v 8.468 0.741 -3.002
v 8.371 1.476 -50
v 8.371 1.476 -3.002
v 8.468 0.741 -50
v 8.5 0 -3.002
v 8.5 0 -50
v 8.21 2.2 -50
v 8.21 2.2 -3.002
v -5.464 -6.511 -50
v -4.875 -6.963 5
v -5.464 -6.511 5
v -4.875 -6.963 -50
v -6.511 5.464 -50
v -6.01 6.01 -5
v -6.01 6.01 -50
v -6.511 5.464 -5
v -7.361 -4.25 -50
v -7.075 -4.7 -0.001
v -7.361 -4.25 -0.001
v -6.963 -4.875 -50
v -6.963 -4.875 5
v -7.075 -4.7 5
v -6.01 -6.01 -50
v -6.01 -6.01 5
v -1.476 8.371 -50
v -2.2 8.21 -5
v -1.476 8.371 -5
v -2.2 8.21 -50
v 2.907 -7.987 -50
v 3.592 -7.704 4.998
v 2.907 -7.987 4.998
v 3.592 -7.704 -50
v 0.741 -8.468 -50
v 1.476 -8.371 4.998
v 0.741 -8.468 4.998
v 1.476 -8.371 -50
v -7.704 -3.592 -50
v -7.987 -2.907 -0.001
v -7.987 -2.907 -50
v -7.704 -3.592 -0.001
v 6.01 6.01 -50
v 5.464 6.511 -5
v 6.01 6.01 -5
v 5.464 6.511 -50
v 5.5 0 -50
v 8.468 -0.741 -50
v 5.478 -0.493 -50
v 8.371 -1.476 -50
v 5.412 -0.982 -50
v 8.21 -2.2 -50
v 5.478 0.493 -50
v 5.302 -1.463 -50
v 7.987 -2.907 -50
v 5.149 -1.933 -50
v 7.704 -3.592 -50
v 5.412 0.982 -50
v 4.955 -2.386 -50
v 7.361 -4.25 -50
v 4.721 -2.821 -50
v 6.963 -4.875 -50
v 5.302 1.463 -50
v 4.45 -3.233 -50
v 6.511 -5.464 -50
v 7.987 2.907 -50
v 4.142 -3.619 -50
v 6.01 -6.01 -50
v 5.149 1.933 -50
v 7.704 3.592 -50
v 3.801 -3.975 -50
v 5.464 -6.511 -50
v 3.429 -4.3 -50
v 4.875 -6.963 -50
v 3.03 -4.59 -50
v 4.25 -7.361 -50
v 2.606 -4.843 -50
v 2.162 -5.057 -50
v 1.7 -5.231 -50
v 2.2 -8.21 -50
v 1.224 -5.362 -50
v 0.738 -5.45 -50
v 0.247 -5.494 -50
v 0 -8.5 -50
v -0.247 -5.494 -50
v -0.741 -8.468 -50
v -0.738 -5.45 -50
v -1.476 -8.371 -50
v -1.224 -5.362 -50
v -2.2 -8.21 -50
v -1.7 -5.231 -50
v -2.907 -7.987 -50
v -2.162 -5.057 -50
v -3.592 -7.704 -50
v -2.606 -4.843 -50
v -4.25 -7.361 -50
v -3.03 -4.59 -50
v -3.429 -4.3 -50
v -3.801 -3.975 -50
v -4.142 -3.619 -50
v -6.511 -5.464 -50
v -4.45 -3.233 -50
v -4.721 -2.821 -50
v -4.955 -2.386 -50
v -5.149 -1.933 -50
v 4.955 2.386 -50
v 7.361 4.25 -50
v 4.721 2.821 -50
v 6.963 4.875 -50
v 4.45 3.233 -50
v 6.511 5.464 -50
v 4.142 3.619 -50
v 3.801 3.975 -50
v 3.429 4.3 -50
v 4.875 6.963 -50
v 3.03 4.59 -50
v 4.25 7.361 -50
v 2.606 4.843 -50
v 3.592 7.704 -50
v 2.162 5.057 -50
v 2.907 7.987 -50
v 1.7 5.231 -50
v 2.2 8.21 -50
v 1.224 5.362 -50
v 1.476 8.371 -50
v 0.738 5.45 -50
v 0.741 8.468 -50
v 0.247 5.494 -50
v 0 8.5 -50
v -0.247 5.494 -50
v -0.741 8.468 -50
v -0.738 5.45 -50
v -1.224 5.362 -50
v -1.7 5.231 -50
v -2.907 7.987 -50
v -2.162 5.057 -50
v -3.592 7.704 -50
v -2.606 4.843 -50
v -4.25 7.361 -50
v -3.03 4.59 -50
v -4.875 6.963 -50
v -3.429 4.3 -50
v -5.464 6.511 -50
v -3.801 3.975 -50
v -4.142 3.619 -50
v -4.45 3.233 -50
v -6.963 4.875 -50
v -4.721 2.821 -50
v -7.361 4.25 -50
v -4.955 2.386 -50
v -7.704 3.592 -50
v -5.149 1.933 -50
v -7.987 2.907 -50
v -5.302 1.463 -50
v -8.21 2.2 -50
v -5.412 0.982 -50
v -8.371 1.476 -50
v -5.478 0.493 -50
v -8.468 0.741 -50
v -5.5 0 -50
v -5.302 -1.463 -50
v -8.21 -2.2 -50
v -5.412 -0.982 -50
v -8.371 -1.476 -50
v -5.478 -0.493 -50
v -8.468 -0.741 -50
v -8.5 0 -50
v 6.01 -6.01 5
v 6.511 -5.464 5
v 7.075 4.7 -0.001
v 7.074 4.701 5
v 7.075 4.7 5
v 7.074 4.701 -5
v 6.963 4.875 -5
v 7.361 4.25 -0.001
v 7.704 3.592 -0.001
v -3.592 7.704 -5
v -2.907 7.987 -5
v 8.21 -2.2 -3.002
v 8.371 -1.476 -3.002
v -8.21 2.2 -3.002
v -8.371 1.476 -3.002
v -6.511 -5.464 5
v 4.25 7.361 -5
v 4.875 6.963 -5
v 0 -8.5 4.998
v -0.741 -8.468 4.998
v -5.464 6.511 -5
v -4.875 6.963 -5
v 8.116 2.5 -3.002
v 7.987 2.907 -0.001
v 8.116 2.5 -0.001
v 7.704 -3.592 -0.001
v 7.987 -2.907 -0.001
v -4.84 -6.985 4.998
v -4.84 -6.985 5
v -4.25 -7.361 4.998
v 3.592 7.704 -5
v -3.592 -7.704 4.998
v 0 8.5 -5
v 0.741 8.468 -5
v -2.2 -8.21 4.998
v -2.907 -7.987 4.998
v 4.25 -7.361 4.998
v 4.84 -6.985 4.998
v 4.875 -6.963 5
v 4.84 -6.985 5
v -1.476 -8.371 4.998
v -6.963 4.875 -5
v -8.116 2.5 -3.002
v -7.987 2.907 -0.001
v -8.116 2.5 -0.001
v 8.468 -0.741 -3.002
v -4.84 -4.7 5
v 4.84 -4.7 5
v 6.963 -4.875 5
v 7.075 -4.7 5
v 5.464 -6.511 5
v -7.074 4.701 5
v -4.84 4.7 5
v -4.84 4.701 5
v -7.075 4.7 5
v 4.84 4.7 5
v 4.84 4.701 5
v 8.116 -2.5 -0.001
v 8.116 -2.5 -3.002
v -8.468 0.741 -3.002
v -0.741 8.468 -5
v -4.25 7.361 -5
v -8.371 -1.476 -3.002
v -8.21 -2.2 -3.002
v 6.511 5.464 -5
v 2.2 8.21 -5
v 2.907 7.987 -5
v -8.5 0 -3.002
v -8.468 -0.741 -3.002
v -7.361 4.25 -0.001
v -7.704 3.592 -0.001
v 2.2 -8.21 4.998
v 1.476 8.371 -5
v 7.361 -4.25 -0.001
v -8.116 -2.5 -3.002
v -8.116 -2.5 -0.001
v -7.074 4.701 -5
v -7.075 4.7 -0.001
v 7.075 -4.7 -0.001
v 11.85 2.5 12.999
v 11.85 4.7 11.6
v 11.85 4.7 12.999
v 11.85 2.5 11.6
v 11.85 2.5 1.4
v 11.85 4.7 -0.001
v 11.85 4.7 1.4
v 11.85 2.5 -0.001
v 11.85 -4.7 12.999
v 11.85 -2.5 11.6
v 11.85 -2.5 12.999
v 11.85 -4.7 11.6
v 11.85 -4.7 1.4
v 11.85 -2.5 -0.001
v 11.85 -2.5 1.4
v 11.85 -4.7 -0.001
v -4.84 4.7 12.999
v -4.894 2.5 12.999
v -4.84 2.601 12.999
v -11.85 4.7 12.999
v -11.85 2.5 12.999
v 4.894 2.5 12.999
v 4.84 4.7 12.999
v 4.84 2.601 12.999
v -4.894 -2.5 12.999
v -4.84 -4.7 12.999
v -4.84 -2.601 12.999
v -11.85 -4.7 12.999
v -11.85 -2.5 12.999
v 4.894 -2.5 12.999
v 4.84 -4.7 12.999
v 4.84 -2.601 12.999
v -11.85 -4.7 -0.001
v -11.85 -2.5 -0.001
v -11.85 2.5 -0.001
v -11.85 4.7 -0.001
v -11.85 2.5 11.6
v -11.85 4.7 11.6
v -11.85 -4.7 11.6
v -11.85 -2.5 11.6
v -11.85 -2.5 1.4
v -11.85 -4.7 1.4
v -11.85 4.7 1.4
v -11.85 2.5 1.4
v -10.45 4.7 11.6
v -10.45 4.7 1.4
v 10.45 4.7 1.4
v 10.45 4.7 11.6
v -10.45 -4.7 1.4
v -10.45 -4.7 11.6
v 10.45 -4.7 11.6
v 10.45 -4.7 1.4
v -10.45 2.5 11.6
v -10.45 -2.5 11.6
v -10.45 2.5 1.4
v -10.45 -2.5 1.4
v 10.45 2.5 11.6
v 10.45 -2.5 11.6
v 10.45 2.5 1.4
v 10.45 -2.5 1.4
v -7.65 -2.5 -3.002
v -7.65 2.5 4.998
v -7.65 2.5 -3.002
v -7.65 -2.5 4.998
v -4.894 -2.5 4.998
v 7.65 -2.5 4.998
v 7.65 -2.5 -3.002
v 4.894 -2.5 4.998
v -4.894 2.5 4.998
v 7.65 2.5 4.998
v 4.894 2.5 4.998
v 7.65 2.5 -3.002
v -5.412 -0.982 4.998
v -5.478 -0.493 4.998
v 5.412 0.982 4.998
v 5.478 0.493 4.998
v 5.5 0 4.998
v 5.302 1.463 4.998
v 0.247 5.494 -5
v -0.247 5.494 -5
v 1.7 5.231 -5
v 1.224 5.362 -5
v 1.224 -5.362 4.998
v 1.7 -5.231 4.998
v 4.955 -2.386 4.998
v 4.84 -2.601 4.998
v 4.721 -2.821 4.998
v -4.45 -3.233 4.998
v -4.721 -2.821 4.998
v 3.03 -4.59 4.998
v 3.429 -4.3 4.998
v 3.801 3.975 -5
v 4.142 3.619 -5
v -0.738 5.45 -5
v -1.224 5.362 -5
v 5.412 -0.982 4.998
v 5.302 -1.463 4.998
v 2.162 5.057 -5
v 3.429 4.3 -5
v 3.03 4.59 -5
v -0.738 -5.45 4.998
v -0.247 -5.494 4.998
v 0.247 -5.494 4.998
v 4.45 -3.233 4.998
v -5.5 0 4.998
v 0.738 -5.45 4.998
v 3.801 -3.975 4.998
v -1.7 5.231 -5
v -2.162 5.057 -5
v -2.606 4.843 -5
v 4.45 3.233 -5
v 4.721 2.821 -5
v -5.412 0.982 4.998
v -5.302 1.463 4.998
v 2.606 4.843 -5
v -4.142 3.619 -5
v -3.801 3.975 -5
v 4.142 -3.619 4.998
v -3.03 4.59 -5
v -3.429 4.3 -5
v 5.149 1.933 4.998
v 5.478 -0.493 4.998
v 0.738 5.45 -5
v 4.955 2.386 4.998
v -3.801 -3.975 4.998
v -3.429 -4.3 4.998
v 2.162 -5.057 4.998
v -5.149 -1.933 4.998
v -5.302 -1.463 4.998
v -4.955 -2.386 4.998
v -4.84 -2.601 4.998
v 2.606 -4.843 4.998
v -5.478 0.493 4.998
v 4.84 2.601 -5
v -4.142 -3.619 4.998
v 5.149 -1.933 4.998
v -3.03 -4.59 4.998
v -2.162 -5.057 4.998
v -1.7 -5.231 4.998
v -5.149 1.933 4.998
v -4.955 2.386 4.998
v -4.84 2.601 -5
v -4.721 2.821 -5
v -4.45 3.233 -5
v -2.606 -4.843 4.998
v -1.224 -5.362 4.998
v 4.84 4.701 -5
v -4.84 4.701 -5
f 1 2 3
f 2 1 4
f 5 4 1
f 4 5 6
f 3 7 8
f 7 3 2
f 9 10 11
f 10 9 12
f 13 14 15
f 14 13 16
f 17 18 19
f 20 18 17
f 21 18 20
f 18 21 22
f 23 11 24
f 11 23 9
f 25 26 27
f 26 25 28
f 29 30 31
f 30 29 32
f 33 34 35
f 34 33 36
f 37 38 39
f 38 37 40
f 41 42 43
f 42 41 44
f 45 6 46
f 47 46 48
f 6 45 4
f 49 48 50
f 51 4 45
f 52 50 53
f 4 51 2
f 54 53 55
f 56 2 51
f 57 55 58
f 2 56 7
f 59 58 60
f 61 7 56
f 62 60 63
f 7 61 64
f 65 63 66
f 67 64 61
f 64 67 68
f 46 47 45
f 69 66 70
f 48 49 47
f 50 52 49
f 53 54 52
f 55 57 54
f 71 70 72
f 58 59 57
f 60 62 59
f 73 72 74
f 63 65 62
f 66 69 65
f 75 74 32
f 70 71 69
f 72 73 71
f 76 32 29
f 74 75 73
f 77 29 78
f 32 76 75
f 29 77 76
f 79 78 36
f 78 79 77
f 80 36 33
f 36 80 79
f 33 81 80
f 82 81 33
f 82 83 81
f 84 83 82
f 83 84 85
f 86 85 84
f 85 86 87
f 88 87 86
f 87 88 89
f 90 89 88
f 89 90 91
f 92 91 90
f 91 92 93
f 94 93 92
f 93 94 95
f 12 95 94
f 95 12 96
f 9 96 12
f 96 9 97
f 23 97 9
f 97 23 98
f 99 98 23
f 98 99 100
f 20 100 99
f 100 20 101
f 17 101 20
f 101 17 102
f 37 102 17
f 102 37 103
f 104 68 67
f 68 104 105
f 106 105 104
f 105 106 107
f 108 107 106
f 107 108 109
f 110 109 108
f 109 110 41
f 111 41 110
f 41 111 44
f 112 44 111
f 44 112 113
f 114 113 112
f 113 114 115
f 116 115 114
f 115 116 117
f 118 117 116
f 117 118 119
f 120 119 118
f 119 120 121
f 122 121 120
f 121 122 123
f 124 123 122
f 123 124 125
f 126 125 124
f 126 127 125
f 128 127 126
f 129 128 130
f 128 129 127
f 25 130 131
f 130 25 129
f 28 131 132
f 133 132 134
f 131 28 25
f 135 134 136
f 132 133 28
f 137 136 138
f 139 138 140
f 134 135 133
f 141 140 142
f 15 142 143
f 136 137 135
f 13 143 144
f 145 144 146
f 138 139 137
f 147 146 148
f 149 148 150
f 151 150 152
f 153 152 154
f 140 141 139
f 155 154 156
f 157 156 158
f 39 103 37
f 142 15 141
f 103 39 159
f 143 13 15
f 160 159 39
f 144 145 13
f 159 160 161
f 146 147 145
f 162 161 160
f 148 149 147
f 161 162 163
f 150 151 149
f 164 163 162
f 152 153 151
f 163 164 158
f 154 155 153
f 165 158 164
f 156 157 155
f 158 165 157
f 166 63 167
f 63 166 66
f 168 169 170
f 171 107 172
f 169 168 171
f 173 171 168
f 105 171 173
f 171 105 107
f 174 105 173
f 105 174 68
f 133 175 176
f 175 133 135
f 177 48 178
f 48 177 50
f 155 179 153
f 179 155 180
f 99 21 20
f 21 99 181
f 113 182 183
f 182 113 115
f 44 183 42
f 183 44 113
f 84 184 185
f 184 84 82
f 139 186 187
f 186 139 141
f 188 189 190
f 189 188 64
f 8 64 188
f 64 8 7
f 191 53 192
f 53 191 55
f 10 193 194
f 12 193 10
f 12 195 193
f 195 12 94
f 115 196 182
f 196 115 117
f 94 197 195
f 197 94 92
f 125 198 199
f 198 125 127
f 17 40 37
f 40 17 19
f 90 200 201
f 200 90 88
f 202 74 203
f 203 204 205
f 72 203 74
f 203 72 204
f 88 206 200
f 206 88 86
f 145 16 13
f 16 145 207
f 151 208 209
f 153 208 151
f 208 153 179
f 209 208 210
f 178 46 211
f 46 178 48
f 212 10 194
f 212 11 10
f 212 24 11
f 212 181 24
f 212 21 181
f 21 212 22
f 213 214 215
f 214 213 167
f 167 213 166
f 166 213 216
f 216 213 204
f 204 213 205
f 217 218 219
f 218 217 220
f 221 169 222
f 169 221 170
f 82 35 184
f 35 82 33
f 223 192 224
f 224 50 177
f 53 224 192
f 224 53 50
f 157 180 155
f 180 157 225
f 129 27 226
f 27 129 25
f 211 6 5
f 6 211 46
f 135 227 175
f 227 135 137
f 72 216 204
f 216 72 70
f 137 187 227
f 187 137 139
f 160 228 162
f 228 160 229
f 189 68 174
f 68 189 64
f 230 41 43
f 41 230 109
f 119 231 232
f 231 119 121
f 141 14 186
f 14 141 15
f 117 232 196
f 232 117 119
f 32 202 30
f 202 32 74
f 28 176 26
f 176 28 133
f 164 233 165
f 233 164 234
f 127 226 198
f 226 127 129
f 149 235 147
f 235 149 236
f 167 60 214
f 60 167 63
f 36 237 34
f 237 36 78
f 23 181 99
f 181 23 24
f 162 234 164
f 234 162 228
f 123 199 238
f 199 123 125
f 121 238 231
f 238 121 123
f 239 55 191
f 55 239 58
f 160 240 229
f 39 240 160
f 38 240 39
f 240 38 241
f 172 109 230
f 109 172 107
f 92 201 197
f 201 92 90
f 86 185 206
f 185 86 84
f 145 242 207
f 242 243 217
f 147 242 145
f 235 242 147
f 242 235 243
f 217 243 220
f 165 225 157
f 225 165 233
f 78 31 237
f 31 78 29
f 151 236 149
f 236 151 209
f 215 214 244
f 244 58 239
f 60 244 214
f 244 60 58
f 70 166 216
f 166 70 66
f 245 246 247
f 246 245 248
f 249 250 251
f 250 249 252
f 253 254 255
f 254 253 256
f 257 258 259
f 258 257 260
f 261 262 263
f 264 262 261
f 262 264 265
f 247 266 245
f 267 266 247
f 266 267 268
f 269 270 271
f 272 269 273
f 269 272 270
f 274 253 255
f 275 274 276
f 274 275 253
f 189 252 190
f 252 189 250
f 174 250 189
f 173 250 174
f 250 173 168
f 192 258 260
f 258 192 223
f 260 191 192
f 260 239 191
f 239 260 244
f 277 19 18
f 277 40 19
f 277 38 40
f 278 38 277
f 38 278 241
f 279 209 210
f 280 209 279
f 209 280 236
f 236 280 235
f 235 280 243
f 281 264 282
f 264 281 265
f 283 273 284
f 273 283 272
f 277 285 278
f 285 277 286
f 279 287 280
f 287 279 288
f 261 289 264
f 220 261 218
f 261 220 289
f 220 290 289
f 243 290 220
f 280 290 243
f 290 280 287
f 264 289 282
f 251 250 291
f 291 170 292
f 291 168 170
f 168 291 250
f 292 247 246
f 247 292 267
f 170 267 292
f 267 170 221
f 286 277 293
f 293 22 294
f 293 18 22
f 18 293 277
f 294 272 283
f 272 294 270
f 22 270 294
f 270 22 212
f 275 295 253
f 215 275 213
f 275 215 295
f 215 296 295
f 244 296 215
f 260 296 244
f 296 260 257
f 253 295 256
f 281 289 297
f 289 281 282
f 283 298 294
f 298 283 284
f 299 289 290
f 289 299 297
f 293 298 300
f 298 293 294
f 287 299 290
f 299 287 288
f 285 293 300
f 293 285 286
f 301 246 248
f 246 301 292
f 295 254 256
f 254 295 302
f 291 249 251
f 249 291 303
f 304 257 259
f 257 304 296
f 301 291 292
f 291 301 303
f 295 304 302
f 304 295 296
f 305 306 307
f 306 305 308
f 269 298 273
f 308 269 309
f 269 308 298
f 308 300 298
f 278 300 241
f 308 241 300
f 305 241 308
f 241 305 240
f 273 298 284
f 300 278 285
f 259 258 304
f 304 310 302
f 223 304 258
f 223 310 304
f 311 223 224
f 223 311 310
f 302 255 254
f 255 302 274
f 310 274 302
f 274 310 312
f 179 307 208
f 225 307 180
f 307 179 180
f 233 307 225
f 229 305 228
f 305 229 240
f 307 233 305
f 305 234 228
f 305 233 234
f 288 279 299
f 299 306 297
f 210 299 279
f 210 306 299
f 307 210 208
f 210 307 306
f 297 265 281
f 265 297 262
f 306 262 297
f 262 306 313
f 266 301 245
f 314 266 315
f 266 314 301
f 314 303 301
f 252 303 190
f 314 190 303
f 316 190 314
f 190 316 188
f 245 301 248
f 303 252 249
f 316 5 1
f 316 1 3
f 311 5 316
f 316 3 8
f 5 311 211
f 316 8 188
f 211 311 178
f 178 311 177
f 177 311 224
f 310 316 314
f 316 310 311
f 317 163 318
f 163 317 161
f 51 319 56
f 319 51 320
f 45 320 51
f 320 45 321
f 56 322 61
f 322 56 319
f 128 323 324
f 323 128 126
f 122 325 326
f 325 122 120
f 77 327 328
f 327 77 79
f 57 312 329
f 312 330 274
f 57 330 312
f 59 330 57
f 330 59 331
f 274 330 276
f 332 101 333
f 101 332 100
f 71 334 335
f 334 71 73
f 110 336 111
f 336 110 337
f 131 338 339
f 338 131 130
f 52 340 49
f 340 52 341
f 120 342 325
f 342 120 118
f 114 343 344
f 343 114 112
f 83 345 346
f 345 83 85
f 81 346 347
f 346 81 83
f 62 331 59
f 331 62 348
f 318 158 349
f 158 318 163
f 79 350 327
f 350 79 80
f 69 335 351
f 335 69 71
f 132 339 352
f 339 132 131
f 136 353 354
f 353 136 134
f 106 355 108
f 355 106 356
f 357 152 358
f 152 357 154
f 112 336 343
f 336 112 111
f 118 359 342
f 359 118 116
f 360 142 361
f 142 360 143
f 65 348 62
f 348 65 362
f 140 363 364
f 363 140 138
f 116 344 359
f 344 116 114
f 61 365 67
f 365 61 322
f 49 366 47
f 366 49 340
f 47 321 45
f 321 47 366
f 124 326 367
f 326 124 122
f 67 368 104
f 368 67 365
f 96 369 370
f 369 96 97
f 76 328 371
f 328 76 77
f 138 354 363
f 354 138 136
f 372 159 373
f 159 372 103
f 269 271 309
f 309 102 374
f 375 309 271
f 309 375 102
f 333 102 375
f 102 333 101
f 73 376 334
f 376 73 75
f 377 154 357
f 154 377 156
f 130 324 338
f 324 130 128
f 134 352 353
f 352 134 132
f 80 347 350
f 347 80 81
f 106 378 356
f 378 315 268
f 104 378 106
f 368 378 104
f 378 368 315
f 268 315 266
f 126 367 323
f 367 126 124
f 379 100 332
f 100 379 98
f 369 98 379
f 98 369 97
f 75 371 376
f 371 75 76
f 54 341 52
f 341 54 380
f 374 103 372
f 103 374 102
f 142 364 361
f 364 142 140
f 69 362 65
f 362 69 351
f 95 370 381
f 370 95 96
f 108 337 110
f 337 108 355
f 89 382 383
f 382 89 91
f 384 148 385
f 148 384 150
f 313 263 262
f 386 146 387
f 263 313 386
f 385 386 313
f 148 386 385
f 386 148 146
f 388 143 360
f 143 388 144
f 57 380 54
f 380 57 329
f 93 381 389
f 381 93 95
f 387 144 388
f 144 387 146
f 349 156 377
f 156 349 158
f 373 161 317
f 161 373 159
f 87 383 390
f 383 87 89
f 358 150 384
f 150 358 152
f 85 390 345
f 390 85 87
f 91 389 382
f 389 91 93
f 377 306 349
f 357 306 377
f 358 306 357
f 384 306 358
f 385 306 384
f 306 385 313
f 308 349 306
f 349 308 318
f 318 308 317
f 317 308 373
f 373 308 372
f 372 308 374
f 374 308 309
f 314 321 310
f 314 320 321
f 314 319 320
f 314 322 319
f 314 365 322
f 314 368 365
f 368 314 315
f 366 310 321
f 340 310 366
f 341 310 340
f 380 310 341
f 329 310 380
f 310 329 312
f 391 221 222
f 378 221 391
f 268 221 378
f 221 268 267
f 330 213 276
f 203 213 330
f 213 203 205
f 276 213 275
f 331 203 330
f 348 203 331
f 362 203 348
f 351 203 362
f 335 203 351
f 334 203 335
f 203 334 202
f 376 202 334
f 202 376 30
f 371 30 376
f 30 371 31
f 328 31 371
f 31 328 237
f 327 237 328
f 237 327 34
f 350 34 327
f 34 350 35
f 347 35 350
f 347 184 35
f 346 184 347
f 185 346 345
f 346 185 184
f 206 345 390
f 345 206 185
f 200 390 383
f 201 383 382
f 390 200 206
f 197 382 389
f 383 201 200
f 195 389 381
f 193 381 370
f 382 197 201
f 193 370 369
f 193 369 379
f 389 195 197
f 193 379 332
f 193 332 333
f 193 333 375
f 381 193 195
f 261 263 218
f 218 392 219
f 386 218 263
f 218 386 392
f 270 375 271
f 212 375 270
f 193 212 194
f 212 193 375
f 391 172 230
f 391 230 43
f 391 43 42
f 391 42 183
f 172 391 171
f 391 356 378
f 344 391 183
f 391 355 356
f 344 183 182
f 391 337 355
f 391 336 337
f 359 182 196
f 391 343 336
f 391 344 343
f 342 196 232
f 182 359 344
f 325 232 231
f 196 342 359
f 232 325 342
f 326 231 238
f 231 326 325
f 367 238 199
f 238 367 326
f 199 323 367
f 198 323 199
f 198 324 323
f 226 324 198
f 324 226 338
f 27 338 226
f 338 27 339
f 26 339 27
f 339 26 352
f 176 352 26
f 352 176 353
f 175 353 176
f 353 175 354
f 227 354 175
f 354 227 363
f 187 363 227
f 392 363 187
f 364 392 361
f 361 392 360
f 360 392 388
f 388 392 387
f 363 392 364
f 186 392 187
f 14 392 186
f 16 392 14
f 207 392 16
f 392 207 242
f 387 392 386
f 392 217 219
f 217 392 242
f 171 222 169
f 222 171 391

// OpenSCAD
$fa = 5;
$fs = 0.5;
eps = 0.001;

tube_id = 11;
tube_od = tube_id + 6;
tube_length = 50;

loom_width = 20.9;
loom_gap = 5;
loom_wall = 2.2;
lip = 1.4;
loom_height = 13;

join = 5;

difference() {
  union() {
    translate([0, 0, -tube_length])
      cylinder(tube_length + join, d=tube_od);
    
    translate([0, 0, loom_height/2 - eps])
      cube([loom_width + 2*lip, loom_gap + 2*loom_wall, loom_height], center=true);
  }
  
  // Inside of tube.
  translate([0, 0, -tube_length-eps])
    cylinder(tube_length*2, d=tube_id);
  
  // Transverse gap.
  translate([0, 0, loom_height/2 + join - eps])
    cube([loom_width + 2*lip + eps, loom_gap, loom_height + eps], center=true);
  
  // Cross gap.
  translate([0, 0, loom_height/2 + join - eps])
    cube([tube_id*0.88, 20, loom_height + eps], center=true);
  
  // Lips.
  for (a = [-1, 1])
    scale([a, 1, 1])
      translate([loom_width/2, -10, lip])
        cube([20, 20, loom_height - 2*lip]);
  
  // Observation port on one side.
  translate([-10, loom_gap/2 + loom_wall + eps, -join])
    cube(20);
  translate([-tube_id*0.44, loom_gap/2 + eps, -join])
    cube([tube_id*0.88, 20, 20]);
  
  // Gap between lips for hook.
  for (a = [-1, 1])
    scale([a, 1, 1])
      translate([tube_od*0.45, -loom_gap/2, -3-2*eps])
        cube([20, loom_gap, 20]);
}
